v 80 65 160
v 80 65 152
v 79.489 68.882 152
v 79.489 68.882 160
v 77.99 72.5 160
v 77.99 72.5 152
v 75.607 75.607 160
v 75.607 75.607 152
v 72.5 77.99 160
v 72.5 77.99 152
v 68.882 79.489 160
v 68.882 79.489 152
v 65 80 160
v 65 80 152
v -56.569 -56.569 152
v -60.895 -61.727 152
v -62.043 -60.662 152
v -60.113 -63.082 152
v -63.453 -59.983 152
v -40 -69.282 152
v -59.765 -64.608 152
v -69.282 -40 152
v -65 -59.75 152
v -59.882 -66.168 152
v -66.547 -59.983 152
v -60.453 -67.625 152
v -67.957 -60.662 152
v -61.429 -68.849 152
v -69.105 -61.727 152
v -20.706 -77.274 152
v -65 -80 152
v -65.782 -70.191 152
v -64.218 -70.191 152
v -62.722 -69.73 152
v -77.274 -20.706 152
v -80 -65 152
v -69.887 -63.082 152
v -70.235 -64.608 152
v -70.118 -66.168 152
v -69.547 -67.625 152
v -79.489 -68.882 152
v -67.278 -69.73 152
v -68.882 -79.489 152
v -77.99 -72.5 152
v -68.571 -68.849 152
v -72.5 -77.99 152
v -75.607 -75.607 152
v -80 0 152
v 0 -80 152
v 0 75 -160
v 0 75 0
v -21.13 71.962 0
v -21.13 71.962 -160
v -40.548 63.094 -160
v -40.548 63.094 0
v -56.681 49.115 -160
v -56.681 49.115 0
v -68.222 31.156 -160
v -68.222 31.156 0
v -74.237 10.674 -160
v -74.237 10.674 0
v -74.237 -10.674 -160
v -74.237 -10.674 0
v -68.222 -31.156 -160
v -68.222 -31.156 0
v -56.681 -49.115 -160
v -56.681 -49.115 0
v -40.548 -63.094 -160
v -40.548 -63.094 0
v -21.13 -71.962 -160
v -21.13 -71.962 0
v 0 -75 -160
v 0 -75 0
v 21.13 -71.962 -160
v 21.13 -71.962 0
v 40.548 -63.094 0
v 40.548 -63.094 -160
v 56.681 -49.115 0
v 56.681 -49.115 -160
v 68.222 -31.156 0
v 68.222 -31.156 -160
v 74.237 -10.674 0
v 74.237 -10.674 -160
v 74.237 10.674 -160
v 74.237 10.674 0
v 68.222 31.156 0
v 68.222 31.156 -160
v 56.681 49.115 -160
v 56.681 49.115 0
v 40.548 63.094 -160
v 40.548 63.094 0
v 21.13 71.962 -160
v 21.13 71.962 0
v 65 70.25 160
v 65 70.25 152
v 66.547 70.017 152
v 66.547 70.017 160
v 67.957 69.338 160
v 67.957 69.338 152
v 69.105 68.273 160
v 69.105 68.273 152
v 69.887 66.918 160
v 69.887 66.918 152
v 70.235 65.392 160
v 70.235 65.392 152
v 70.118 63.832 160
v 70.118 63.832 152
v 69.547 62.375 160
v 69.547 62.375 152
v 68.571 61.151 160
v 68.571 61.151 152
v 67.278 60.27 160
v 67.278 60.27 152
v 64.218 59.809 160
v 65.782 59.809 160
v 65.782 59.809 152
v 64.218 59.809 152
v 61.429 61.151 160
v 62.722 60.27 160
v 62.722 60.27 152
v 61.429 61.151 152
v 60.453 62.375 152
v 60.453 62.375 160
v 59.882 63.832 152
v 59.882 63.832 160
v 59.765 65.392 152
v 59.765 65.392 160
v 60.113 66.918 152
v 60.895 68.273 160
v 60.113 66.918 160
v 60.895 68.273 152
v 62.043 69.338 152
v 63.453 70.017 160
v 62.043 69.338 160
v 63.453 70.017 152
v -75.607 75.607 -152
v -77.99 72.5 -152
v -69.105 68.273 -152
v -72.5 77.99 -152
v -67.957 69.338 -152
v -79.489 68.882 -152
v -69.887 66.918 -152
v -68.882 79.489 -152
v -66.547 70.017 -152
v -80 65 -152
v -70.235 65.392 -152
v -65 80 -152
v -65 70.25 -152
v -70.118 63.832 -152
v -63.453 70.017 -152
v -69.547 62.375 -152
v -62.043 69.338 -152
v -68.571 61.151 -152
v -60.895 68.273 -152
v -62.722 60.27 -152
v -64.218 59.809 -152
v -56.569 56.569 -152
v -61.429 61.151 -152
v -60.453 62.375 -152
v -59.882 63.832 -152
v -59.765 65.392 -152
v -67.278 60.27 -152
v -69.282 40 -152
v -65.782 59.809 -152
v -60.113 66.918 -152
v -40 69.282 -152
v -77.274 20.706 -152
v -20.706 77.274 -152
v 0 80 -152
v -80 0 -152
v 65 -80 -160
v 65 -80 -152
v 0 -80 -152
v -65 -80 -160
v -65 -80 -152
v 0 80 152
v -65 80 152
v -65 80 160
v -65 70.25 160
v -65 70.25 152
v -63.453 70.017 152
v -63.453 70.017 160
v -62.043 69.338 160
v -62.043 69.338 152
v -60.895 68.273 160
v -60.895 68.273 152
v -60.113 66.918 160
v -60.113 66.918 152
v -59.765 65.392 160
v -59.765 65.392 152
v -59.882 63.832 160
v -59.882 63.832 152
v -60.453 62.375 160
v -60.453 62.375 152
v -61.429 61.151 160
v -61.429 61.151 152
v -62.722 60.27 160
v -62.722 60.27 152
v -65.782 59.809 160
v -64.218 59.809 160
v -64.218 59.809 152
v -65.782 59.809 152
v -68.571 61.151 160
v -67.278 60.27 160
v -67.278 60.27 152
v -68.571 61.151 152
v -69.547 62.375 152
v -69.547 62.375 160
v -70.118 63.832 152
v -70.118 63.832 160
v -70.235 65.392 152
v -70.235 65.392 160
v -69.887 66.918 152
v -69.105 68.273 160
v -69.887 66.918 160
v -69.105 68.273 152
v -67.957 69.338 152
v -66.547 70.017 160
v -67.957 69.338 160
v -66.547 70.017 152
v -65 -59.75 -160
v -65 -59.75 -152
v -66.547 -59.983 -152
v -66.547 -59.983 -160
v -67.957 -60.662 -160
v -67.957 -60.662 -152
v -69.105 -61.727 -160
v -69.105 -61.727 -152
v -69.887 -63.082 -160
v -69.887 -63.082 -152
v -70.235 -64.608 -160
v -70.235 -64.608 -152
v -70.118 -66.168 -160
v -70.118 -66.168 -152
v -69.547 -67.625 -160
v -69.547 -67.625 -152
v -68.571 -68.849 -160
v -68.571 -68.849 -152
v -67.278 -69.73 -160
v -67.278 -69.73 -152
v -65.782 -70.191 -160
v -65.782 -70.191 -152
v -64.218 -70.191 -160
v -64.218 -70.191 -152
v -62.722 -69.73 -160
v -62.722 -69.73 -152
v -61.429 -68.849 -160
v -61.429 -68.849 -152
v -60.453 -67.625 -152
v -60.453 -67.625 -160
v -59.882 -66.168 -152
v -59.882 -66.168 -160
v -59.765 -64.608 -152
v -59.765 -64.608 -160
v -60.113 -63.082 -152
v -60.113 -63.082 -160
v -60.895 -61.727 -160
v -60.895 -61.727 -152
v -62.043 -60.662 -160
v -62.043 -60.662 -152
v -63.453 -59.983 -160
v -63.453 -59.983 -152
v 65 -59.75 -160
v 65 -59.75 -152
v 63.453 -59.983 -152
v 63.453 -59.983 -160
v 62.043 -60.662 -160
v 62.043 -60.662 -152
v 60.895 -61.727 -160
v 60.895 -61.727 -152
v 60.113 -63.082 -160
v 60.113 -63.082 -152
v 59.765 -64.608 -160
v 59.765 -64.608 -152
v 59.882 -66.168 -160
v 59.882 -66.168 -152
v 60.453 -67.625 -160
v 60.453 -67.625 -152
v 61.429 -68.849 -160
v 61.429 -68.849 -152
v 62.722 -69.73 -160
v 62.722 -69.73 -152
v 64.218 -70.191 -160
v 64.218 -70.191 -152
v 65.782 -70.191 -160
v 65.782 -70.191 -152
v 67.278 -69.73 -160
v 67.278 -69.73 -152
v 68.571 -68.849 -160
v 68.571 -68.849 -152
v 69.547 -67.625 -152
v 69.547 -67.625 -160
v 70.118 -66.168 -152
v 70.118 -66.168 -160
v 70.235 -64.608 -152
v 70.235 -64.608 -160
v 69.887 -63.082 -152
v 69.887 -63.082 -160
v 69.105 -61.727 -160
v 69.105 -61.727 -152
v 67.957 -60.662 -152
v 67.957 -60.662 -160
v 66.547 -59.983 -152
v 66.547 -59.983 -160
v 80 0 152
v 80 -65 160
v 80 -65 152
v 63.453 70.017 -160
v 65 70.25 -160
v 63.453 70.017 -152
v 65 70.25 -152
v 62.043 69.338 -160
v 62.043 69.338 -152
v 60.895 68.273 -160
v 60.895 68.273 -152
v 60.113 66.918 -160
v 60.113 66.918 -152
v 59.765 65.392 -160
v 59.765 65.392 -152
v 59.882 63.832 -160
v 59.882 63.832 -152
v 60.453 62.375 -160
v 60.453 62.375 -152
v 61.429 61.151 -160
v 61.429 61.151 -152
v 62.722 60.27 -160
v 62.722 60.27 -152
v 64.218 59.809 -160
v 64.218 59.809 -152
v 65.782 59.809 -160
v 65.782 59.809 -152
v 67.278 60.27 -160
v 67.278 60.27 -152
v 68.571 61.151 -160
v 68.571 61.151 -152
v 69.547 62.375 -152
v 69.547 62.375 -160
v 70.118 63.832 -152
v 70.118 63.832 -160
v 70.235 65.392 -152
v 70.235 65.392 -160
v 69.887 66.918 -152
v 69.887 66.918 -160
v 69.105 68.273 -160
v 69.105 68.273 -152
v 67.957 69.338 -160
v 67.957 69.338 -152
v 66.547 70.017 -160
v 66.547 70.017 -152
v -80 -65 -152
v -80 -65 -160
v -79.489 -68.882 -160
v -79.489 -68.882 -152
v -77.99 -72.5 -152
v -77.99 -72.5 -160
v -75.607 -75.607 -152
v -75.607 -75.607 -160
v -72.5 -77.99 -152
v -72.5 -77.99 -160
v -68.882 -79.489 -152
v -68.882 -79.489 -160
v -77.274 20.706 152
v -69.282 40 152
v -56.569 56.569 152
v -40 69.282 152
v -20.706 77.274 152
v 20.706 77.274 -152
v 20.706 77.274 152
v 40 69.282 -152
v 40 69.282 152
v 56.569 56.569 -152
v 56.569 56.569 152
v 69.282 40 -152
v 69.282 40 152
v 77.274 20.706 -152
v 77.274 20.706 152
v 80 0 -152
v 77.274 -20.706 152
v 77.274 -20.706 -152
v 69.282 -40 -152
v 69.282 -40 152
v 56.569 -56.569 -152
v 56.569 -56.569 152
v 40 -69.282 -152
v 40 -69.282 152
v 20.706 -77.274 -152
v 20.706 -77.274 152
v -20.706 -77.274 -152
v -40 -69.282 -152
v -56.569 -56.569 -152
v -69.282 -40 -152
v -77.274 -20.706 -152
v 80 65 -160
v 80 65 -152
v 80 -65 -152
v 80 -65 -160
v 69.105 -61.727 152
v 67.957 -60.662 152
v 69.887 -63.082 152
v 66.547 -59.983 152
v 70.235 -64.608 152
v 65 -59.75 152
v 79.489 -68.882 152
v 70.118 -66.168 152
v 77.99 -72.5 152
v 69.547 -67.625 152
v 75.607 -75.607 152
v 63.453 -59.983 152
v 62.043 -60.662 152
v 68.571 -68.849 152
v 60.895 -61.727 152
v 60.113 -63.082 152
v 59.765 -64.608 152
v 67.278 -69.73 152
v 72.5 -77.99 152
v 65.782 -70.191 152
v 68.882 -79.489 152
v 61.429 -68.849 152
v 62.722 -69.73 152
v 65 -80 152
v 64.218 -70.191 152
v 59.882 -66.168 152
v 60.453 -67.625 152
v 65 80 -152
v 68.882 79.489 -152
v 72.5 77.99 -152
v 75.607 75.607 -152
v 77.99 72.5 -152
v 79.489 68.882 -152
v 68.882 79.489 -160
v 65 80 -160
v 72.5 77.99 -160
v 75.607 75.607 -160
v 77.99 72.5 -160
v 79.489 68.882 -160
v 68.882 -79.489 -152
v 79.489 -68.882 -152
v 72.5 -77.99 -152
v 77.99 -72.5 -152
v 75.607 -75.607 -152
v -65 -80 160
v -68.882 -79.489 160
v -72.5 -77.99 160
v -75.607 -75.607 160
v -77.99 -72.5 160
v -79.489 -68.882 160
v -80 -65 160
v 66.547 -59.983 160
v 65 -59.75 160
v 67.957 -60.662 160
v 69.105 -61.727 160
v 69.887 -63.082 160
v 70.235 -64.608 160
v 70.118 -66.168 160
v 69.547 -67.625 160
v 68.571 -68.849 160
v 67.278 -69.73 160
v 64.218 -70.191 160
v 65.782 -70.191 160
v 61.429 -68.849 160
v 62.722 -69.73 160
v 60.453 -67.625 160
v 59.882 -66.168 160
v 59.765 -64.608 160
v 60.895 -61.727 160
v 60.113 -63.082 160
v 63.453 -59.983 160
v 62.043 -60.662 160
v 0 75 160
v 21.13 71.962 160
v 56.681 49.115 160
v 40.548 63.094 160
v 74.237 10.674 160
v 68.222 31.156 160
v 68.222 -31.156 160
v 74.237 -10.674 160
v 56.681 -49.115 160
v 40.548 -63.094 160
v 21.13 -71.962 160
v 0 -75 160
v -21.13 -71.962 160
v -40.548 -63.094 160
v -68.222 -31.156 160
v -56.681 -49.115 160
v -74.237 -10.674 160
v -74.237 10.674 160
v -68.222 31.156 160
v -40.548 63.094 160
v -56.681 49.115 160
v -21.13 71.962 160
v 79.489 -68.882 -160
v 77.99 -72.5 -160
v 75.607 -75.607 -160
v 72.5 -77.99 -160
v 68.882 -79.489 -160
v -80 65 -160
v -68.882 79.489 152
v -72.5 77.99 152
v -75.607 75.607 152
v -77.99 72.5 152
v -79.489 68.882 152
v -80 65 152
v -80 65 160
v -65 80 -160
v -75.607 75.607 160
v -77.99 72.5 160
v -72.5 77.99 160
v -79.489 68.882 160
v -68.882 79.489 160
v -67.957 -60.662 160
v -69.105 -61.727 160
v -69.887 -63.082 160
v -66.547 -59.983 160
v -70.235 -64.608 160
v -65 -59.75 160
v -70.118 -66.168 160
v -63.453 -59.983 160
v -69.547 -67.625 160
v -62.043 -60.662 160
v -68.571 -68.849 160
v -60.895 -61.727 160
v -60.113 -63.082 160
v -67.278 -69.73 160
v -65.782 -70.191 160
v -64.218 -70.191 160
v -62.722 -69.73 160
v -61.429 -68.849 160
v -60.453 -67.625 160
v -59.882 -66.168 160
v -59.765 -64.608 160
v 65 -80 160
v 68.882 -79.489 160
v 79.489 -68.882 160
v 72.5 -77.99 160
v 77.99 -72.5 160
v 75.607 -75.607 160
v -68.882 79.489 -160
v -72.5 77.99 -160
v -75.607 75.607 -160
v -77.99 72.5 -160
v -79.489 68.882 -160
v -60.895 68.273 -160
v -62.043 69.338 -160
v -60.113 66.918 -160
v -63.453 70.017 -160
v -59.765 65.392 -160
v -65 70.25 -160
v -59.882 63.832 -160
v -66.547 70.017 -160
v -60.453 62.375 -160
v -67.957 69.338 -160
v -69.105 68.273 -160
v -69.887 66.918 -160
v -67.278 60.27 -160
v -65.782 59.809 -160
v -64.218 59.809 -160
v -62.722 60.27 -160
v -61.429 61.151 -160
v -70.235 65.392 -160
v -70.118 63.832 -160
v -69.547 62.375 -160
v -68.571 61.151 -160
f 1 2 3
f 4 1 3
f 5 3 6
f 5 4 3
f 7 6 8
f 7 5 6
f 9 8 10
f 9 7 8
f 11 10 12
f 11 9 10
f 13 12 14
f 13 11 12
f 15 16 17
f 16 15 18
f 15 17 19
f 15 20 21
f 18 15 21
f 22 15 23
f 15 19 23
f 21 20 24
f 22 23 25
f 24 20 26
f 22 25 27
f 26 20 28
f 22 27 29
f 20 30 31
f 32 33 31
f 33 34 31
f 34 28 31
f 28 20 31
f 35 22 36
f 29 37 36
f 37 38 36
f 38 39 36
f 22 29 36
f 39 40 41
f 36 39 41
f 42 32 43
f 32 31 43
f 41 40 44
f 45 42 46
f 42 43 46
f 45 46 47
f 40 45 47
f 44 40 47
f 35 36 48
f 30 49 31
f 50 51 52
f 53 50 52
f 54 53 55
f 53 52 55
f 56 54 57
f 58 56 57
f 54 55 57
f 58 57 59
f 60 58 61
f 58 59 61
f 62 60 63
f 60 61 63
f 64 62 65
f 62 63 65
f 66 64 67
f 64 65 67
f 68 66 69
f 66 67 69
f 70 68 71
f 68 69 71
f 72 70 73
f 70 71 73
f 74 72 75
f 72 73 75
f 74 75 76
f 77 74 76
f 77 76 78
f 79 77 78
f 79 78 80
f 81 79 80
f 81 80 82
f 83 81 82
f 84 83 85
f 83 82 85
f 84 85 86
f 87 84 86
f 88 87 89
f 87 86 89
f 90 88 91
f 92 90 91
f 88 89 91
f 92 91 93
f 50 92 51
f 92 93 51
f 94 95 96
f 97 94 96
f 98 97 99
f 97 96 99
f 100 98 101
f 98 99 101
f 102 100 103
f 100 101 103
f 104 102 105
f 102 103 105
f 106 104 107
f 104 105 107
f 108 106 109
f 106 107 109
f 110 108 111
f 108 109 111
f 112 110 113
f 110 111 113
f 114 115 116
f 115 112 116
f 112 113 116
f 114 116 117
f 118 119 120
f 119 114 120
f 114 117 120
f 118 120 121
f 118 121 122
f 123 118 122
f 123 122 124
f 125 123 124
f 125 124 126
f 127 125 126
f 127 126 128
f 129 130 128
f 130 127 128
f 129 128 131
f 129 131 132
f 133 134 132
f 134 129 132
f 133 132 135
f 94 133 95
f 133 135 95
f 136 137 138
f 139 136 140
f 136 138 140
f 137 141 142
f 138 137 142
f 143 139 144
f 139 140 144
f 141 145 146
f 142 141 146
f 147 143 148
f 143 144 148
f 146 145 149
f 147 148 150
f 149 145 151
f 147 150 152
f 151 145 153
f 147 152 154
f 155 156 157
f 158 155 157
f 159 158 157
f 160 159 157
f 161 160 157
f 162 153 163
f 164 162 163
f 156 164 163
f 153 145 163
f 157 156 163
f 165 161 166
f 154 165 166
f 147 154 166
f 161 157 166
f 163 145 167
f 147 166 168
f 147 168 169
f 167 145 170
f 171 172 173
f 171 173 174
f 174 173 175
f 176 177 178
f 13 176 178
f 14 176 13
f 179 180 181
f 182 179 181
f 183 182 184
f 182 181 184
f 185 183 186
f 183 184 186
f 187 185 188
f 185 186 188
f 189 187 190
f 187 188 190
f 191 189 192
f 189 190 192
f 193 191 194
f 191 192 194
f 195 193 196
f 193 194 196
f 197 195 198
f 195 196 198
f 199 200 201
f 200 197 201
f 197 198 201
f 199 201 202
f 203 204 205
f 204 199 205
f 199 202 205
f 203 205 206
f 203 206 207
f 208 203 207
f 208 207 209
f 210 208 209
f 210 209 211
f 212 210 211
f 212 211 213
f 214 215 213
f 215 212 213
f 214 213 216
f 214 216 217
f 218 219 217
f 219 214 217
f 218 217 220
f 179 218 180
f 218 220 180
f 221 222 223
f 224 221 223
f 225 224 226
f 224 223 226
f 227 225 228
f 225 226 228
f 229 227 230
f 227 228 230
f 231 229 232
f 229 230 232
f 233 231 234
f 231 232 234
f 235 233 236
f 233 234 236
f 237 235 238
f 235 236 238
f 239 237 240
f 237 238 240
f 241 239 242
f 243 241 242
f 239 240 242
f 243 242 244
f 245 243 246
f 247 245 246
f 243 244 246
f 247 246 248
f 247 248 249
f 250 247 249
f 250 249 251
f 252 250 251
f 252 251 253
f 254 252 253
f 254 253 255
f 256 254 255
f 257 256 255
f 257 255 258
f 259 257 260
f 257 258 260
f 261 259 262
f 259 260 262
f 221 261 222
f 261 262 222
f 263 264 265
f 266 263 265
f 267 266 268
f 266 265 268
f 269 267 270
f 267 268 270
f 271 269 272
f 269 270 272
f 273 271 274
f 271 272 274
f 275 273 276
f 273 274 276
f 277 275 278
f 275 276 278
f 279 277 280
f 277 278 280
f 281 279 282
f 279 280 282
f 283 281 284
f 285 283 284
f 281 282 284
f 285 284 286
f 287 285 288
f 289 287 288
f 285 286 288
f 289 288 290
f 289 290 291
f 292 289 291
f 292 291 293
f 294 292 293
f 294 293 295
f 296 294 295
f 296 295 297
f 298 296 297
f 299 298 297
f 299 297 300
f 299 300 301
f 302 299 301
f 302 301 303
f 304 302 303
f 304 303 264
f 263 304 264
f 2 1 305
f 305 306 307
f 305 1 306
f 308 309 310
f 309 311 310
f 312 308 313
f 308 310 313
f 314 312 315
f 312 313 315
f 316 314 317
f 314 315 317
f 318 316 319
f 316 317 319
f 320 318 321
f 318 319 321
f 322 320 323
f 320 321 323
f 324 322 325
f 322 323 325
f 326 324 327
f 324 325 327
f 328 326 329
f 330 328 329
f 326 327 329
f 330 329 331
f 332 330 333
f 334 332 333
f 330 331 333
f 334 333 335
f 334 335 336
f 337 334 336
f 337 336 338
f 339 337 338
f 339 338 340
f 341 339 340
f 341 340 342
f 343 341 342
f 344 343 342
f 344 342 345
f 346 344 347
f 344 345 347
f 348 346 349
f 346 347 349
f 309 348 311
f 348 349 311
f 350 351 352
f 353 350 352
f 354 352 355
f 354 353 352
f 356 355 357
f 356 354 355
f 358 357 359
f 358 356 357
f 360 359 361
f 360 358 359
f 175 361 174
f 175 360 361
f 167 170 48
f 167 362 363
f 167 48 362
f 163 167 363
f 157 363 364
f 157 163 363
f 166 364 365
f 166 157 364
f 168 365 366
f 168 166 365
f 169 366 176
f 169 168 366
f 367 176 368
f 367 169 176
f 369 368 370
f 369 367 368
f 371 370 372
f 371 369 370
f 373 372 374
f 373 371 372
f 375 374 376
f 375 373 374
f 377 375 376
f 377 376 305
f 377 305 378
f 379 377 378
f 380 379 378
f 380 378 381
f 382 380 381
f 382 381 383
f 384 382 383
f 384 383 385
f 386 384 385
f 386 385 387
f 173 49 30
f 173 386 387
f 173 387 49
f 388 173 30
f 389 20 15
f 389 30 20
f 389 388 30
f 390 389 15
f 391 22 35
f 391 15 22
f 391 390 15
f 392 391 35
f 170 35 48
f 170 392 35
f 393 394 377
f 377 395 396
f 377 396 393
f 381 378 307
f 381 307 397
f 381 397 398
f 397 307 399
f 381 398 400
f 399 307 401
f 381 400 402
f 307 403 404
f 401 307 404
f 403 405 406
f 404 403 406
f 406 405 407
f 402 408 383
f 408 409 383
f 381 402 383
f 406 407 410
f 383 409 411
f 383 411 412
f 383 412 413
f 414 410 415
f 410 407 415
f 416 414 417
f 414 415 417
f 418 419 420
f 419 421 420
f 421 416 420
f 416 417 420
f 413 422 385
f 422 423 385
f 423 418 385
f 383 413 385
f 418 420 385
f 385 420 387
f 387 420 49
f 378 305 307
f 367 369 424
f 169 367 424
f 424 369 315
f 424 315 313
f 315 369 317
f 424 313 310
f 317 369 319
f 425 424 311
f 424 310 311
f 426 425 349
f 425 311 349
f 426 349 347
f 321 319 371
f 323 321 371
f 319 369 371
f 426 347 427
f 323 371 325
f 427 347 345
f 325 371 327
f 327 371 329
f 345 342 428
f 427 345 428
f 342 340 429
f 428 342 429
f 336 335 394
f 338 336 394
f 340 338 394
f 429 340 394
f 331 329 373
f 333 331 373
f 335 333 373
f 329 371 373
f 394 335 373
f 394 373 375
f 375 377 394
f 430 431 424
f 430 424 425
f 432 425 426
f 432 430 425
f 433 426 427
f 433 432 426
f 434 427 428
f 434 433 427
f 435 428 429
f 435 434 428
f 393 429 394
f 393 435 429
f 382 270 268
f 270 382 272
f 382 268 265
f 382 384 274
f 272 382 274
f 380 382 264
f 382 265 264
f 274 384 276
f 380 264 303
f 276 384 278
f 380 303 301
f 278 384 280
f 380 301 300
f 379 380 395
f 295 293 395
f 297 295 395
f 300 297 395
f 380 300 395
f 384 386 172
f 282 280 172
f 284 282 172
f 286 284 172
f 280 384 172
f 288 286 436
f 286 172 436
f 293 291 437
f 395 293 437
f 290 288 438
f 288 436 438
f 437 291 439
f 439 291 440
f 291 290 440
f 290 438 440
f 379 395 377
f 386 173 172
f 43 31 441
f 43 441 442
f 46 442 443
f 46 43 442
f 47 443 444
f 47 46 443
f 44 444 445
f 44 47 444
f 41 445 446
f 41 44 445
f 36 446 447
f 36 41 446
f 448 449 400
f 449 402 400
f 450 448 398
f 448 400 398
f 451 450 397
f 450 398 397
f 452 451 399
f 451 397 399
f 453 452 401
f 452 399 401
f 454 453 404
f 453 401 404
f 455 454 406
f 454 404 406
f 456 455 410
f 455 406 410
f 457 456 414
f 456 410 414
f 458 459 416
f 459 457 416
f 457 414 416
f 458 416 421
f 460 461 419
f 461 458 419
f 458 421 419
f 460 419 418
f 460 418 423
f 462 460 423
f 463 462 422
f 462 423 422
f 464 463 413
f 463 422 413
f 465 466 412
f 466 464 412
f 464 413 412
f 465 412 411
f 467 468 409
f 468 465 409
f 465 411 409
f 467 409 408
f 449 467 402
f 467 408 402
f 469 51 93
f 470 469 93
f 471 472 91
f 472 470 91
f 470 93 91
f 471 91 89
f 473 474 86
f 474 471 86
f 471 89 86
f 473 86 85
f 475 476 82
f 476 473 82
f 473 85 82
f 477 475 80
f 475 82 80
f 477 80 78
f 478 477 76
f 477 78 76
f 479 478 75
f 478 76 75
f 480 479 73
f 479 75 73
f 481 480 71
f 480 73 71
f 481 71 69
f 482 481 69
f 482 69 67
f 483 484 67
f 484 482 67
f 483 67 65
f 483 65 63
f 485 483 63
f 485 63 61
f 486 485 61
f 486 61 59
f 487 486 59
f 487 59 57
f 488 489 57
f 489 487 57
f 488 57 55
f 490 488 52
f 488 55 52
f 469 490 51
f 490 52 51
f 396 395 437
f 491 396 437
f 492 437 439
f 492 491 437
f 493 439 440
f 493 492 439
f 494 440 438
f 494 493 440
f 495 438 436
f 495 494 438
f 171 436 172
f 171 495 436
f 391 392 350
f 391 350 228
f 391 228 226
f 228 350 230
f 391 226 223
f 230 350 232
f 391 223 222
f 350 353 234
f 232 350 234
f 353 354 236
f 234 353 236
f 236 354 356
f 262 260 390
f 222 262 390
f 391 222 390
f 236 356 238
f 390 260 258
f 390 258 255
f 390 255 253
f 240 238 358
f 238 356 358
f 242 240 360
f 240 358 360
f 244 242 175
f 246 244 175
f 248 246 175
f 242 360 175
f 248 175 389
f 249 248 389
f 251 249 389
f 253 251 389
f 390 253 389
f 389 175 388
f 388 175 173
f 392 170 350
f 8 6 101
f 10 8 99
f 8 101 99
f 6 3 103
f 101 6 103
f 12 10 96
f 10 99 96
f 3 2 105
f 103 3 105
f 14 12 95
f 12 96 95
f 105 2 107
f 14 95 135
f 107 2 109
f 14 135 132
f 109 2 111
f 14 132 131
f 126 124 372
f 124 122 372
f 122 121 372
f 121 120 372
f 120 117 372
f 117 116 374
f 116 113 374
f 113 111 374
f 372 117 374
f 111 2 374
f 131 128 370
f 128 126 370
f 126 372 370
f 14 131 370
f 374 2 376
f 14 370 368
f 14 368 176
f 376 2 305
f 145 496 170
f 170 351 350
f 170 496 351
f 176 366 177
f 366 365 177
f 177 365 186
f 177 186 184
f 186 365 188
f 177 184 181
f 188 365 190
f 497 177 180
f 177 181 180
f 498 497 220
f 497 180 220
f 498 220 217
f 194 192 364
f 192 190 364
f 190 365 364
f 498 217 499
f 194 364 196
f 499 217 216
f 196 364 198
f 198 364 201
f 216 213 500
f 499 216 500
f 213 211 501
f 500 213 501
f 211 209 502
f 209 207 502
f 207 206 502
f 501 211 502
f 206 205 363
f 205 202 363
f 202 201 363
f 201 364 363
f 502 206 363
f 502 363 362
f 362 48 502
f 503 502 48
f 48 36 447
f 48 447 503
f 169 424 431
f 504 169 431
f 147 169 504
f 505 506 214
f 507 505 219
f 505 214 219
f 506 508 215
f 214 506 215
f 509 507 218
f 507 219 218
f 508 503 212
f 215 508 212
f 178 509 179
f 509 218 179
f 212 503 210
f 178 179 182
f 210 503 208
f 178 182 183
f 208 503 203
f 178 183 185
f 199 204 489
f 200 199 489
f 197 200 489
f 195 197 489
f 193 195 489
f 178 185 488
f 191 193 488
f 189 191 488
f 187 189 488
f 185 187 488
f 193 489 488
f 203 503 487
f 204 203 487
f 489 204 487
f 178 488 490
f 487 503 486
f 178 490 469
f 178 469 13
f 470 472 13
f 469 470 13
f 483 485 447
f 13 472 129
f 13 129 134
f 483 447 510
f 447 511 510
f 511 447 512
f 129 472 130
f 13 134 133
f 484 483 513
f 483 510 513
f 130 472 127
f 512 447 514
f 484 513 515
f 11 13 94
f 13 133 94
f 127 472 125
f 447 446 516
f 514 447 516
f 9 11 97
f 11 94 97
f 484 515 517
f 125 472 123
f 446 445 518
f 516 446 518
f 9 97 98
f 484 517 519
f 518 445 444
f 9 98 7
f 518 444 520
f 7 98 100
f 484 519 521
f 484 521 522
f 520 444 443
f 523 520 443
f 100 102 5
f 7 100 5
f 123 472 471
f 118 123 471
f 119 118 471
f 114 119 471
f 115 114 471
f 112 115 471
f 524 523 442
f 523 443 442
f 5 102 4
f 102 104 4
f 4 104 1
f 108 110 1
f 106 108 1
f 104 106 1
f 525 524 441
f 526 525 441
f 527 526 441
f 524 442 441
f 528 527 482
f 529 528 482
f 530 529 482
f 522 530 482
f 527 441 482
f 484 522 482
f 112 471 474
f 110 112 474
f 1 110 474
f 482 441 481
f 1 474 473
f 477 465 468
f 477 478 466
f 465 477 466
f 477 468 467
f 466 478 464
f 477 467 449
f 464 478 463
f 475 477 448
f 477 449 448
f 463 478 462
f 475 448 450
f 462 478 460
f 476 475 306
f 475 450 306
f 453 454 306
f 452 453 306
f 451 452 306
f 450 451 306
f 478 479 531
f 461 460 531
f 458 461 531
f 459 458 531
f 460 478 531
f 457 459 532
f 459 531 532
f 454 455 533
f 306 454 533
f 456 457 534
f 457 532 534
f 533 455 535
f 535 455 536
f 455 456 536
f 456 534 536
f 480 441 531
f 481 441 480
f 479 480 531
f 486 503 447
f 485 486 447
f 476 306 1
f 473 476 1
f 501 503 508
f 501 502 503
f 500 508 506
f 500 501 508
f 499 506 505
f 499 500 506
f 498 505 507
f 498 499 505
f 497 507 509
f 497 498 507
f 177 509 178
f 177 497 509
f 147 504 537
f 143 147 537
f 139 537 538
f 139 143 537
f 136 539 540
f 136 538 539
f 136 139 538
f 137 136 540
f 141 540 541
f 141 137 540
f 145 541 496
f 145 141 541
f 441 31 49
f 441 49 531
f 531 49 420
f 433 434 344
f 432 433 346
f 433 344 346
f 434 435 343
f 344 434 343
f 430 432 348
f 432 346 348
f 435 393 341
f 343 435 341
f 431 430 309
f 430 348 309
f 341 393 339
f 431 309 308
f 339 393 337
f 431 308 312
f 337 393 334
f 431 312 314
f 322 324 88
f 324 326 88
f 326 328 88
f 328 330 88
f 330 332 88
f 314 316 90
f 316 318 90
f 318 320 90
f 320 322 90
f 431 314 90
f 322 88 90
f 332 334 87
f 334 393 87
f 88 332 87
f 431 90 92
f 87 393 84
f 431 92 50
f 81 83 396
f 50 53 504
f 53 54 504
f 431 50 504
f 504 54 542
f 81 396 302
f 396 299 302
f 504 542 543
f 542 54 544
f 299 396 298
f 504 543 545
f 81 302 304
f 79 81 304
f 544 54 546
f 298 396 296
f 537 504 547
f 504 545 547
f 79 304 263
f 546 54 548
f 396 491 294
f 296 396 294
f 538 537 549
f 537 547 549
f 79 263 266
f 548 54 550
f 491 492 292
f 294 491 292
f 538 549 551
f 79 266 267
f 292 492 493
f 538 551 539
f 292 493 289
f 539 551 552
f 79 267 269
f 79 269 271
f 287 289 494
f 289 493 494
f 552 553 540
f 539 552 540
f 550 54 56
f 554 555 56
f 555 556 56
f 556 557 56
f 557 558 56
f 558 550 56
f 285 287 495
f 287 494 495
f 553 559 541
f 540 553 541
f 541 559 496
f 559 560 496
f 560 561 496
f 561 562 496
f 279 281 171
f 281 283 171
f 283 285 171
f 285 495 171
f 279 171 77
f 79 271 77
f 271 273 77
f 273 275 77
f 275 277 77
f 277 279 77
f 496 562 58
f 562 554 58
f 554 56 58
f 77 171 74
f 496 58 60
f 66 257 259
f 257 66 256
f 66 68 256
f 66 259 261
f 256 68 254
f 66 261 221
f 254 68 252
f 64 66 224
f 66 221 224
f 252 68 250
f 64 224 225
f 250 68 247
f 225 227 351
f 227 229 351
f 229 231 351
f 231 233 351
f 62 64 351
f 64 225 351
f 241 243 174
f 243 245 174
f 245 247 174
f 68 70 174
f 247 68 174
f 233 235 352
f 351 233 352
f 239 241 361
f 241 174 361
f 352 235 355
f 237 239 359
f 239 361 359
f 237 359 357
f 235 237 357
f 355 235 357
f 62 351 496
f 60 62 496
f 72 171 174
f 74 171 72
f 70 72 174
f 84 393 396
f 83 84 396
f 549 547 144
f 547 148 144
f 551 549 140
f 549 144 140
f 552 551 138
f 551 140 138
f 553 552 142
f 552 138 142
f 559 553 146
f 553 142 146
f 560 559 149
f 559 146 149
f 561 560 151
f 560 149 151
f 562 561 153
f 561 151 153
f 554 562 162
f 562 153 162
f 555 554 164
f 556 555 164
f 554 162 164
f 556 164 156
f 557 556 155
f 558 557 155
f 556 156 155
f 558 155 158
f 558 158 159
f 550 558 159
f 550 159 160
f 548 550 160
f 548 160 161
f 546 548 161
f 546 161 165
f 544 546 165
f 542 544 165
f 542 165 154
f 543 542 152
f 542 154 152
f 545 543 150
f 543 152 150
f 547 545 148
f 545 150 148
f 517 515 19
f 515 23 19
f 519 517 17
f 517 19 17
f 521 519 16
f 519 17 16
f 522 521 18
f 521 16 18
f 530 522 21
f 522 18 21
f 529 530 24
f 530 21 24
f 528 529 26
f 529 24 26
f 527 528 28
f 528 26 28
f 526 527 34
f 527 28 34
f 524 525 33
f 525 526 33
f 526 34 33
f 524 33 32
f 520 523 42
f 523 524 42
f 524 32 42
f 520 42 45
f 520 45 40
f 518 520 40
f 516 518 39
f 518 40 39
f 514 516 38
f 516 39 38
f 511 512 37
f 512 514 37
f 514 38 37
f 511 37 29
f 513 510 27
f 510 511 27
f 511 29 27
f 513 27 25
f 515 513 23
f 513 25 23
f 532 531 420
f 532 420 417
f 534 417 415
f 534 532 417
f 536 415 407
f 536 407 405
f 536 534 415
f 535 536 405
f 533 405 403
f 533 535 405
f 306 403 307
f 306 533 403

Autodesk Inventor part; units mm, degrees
ref_plane "YZ Plane" through (0, 0, 0) normal (1, 0, 0) x (0, 1, 0)
ref_plane "XZ Plane" through (0, 0, 0) normal (0, 1, 0) x (-1, 0, 0)
ref_plane "XY Plane" through (0, 0, 0) normal (0, 0, 1) x (1, 0, 0)
sketch "Skizze1" plane through (0, 0, 0) normal (0, 1, 0) x (-1, 0, 0)
  line L0 (0, 0) -> (80, 0)
  line L1 (80, 0) -> (80, -152)
  line L2 (80, -152) -> (0, -152)
  line L3 (0, -152) -> (0, 0)
  line L4 (80, -152) -> (-80, -152)
  line L5 (-80, -152) -> (-80, -160)
  line L6 (-80, -160) -> (80, -160)
  line L7 (80, -160) -> (80, -152)
  dimension "d0" = 160
  dimension "d1" = 160
  dimension "d2" = 8
revolve "Umdrehung1" add sketch "Skizze1" angle 360 about axis through (0, 0, -152) along (0, 0, 1) contours L0 L1 L2 L3
extrude "Extrusion1" add sketch "Skizze1" along normal mid plane 160 contours L2 L7 L6 L5 L4
fillet "Rundung1" radius 15 4 edges at (80, 80, -156) (-80, 80, -156) (80, -80, -156) (-80, -80, -156)
sketch "Skizze2" plane through (65, 80, -160) normal (0, 0, -1) x (-1, 0, 0)
  circle A0 centre (65, -80) radius 80 projected
hole "Bohrung1" at (0, 0, -160) direction (0, 0, 1) diameter 150 end through all
sketch "Skizze3" plane through (65, 80, -160) normal (0, 0, -1) x (-1, 0, 0)
  line L0 (130, -145) -> (0, -145)
  line L1 (0, -145) -> (0, -15)
  line L2 (0, -15) -> (130, -15)
  line L3 (130, -15) -> (130, -145)
  line L4 (130, -145) -> (0, -15) construction
  line L5 (0, -145) -> (130, -15) construction
  point P0 (65, -80)
  dimension "d14" = 130
  dimension "d15" = 130
hole "Bohrung2" at (-65, 65, -160) at (65, 65, -160) at (65, -65, -160) at (-65, -65, -160) direction (0, 0, 1) diameter 10.5 end through all
mirror "Spiegeln1" about plane through (-80, 0, 0) normal (0, 0, 1)
equation "\"d4\" = d0"
properties part number "Gehäuse" material "Stahl AISI 1080"
